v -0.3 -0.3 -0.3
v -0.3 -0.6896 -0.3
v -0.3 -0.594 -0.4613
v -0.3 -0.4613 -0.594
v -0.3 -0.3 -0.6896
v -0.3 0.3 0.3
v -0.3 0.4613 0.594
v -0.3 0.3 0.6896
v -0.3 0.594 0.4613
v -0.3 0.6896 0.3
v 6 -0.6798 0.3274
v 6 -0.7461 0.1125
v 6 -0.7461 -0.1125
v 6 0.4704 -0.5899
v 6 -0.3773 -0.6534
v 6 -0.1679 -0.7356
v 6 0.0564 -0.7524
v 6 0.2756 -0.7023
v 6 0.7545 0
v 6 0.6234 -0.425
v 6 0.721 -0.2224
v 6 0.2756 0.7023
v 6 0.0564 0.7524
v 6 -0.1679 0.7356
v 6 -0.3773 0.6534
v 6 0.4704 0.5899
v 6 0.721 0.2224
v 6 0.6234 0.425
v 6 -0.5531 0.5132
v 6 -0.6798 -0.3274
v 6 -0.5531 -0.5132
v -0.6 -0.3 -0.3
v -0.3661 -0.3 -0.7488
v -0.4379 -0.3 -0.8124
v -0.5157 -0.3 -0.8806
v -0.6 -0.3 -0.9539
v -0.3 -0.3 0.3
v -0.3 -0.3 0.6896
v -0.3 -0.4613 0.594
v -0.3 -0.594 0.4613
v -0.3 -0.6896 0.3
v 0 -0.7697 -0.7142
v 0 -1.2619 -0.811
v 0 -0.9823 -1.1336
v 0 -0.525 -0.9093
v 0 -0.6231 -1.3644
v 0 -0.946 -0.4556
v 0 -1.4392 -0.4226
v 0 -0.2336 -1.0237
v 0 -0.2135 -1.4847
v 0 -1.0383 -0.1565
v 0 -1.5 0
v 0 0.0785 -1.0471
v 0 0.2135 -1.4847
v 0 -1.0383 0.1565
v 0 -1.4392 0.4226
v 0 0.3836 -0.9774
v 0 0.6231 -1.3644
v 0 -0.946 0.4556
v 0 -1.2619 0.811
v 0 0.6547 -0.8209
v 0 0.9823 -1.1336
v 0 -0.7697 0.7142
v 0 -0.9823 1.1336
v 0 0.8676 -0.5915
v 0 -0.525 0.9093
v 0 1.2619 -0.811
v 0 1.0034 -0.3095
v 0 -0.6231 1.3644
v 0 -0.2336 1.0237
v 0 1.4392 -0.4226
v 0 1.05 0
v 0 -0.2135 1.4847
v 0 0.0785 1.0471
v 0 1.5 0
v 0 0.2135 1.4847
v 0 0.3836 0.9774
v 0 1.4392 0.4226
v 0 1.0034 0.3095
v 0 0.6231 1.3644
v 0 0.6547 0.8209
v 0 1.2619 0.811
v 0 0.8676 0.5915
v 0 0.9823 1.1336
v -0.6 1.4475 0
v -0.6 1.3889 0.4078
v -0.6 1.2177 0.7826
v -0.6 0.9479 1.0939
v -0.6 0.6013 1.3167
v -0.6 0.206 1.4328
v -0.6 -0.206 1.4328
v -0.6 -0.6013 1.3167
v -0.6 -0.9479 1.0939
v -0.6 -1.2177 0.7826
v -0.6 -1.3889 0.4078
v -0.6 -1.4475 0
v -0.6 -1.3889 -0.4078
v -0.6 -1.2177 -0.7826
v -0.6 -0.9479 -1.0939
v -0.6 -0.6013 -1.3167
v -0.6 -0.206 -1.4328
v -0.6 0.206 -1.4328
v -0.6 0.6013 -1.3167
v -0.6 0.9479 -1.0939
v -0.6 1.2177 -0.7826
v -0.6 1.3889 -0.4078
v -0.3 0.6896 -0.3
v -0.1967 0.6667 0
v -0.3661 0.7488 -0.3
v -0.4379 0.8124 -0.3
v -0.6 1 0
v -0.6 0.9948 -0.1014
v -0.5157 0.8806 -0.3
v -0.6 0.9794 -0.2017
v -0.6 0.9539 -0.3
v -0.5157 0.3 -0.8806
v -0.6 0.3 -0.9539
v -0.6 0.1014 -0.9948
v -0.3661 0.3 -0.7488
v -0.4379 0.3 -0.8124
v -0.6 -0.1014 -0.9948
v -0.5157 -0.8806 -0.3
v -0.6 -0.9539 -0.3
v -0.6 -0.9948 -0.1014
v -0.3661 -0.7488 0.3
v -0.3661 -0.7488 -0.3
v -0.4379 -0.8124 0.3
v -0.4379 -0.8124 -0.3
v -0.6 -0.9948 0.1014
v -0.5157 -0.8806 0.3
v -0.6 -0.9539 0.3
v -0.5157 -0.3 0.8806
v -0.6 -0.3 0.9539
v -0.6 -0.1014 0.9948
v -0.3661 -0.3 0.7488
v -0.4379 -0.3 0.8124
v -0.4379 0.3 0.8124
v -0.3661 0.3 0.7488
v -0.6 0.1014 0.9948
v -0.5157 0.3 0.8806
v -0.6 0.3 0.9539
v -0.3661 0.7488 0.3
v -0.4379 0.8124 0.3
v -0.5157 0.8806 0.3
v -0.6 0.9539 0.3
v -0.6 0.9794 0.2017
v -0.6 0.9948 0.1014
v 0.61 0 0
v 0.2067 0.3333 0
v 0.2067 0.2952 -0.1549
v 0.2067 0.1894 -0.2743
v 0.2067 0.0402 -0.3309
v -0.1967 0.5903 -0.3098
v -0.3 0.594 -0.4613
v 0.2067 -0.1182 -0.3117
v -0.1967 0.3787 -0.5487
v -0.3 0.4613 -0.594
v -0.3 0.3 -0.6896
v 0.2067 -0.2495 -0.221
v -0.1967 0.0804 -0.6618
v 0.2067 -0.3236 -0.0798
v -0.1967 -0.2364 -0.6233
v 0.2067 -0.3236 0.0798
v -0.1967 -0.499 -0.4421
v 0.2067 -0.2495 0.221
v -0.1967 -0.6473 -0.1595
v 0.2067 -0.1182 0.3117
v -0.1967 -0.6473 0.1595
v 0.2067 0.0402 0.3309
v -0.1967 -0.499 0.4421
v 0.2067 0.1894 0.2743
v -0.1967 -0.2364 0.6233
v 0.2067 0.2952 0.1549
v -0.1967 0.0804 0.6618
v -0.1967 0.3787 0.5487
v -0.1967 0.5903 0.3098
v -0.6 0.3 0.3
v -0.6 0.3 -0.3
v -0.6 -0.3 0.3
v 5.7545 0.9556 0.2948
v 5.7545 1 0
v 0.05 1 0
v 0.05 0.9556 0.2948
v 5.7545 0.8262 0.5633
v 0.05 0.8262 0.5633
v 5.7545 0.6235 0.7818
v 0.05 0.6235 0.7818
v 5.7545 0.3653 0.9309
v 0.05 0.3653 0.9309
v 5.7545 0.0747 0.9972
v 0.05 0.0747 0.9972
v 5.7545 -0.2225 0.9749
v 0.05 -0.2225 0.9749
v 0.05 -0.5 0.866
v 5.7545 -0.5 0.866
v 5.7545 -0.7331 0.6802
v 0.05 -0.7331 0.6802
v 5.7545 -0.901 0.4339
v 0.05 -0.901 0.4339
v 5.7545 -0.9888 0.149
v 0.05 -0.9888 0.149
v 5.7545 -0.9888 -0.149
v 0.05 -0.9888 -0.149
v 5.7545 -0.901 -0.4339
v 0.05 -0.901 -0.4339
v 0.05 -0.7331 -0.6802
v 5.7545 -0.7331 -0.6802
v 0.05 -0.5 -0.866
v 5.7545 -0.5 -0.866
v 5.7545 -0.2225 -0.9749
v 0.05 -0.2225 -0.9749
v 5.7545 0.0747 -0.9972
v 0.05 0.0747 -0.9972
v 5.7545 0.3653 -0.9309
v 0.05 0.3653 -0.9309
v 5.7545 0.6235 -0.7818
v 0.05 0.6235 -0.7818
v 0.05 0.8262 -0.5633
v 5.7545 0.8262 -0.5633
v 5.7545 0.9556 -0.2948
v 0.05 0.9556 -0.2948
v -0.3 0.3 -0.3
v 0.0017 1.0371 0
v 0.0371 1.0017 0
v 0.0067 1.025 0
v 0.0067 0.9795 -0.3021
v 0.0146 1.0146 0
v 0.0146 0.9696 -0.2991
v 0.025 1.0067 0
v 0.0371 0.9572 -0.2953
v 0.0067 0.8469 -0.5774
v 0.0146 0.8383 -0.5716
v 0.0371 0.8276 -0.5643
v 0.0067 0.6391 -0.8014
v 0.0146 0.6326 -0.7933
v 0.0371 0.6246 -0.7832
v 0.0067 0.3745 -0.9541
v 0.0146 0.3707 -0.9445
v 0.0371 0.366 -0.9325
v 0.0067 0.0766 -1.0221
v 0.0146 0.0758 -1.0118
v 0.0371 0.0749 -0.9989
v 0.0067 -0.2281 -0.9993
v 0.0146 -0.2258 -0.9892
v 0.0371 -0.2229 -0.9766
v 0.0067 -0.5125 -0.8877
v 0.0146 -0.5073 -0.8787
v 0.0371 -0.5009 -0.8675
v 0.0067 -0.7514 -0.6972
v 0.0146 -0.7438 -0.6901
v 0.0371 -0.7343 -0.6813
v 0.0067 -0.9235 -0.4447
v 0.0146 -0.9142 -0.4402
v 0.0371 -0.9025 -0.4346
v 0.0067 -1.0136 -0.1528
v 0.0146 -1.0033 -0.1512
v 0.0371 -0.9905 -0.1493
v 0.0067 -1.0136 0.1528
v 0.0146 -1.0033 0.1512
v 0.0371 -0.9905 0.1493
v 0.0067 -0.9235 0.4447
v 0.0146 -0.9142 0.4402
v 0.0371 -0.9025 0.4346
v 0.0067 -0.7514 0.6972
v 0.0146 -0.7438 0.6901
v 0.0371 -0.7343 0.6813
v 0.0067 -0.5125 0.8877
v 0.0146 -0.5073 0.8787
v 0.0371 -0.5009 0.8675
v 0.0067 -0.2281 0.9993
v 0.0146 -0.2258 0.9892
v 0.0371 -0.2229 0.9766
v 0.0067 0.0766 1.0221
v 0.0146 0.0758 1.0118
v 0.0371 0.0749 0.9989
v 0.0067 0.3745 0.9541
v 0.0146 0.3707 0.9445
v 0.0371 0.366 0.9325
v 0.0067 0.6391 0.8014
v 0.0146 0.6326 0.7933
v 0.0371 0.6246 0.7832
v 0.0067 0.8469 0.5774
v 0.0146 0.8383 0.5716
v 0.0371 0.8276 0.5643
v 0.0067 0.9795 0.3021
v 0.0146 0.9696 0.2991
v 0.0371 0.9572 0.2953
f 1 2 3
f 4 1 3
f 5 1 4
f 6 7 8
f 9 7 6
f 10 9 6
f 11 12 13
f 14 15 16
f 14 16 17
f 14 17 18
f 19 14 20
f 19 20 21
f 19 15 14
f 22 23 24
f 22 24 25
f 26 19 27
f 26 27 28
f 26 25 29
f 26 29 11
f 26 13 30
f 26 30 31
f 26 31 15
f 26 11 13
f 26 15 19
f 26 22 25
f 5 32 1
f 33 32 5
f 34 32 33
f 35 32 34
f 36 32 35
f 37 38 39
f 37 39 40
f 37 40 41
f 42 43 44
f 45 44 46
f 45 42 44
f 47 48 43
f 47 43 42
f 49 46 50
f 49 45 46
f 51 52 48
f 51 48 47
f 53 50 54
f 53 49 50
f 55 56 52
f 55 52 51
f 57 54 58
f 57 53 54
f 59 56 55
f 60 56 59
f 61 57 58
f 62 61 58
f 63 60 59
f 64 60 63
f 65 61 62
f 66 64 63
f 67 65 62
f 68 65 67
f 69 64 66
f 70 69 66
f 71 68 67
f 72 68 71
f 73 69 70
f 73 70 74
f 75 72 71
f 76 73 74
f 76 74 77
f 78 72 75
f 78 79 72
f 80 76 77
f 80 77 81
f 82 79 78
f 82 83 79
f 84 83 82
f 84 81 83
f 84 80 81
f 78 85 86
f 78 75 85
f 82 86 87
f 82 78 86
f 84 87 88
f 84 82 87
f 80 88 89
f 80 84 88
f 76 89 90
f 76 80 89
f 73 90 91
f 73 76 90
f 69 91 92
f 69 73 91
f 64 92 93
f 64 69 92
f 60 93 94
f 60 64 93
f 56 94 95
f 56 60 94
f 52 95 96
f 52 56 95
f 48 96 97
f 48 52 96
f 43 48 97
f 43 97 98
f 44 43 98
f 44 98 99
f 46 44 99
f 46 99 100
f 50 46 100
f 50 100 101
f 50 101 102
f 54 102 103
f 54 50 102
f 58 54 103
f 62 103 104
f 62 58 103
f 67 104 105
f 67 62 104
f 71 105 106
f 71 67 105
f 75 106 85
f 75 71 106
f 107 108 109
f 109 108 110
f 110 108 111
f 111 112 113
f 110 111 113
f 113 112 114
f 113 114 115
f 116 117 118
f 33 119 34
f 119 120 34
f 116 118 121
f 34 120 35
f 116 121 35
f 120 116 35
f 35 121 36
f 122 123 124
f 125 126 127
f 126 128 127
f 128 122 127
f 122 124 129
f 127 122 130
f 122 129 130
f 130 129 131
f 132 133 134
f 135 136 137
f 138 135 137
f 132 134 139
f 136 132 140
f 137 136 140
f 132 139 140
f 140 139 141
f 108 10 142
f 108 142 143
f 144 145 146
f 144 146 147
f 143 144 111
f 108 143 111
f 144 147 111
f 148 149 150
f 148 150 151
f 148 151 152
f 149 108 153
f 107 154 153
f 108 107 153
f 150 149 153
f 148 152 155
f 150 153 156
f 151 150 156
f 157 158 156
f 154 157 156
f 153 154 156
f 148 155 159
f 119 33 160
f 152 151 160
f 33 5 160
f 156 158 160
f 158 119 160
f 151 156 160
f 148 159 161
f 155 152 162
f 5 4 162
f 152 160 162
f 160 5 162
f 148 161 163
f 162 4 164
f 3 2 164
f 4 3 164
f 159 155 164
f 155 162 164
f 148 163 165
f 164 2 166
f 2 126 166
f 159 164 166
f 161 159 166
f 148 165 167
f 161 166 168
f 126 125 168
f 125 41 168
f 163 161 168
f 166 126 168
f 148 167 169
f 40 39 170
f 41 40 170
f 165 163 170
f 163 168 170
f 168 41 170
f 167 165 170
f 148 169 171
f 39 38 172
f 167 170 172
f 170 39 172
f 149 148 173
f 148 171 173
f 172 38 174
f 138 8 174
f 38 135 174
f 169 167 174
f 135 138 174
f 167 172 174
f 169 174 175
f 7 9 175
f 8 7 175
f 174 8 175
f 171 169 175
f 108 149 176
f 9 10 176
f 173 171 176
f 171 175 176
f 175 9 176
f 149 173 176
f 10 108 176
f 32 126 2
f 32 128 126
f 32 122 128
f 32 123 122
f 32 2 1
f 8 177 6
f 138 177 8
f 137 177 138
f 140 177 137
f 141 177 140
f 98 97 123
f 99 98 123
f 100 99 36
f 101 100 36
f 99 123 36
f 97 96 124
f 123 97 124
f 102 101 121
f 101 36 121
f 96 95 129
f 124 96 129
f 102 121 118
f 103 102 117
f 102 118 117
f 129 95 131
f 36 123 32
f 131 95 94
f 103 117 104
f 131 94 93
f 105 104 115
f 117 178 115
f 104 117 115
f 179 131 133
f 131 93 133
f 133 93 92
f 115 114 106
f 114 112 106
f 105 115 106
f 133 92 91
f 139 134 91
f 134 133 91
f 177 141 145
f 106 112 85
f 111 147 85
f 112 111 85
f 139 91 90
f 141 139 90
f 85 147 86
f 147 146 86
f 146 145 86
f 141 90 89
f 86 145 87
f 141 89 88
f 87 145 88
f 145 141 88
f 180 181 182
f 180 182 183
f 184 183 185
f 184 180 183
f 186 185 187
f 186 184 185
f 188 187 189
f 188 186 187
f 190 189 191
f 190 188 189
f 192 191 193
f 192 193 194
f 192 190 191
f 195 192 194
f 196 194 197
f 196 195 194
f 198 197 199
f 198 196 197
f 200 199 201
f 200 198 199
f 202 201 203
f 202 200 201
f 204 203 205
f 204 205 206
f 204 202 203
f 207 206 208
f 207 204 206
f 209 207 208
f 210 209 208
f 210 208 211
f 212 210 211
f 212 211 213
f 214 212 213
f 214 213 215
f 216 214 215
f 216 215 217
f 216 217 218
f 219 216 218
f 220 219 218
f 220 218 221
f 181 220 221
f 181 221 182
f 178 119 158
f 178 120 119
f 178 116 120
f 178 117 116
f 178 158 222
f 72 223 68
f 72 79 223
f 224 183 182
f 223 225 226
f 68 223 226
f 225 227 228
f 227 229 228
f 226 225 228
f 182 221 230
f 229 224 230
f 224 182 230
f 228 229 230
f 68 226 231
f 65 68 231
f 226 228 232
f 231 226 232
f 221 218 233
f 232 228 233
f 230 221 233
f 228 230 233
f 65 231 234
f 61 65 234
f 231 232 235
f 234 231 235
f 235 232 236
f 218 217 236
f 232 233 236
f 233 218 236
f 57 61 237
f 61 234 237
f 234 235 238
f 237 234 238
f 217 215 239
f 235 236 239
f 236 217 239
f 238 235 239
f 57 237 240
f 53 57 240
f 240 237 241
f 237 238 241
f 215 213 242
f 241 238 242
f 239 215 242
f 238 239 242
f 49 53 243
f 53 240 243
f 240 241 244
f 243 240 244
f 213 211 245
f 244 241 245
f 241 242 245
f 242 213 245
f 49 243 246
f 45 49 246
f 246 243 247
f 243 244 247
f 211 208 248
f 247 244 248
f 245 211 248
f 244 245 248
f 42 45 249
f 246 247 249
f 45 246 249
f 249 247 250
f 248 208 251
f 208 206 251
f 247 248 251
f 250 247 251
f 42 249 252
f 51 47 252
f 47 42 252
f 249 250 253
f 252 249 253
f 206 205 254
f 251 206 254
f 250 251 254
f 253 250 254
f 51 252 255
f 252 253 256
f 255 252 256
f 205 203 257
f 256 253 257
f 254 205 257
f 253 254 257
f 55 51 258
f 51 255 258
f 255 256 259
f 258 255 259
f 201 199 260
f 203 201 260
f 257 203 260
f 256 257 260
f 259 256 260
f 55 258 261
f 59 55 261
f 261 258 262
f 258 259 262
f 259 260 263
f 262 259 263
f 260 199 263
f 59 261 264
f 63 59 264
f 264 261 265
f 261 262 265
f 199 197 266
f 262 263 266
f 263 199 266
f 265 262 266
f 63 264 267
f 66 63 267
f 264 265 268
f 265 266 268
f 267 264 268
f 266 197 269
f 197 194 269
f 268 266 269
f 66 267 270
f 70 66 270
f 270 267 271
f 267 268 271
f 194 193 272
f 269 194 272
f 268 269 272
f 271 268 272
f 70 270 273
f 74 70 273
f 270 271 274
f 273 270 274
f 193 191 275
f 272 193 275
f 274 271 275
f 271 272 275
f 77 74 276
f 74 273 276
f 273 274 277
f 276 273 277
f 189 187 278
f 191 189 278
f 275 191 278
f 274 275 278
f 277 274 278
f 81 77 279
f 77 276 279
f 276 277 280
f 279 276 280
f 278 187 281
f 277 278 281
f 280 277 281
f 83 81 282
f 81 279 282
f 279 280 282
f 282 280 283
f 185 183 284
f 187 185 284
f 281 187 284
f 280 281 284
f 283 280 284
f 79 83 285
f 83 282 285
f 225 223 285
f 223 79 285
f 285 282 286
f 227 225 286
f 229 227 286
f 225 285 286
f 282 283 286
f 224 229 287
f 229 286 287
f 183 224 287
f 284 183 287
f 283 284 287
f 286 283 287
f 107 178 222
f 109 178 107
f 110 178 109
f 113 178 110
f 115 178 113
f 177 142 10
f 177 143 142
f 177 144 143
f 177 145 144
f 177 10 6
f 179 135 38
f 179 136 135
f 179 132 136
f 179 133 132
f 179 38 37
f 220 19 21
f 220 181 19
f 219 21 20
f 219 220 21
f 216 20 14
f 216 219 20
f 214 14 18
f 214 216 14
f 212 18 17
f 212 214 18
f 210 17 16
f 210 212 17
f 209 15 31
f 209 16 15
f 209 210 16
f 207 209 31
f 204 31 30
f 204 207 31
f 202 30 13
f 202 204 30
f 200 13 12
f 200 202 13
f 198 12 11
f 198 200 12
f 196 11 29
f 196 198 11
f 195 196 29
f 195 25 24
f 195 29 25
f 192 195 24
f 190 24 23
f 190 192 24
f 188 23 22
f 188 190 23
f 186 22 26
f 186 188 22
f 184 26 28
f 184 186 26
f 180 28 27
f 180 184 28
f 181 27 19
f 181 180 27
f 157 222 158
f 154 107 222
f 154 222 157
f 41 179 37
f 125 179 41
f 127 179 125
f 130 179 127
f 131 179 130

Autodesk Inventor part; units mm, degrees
sketch "Sketch_1" plane through (0, 0, 0) normal (0, 0, 1) x (1, 0, 0)
  line L0 (6, 0) -> (-0.6, 0)
  line L1 (-0.6, 0) -> (-0.6, 1.5)
  line L2 (-0.6, 1.5) -> (0, 1.5)
  line L3 (0, 1.5) -> (0, 1.05)
  arc A0 (0, 1.05) -> (0.05, 1) centre (0.05, 1.05) ccw
  line L4 (0.05, 1) -> (5.7545, 1)
  line L5 (5.7545, 1) -> (6, 0.7545)
  line L6 (6, 0.7545) -> (6, 0)
  line L7 (6, 0) -> (-0.6, 0)
revolve "Revolution1" add sketch "Sketch_1" angle 360 about axis through (6, 0, 0) along (1, 0, 0)
thread "Thread1" size "M2x0.4" class "6g" standard "ISO Metric profile" length 5.3545
sketch "Sketch_3" plane through (0, 0, 0) normal (0, 0, 1) x (1, 0, 0)
  line L0 (0.61, 0) -> (-0.6, 0)
  line L1 (-0.6, 0) -> (-0.6, 1)
  line L2 (-0.6, 1) -> (0.61, 0)
  line L3 (0.61, 0) -> (-0.6, 0)
revolve "Revolution2" cut sketch "Sketch_3" angle 360 about axis through (0.61, 0, 0) along (1, 0, 0)
sketch "Sketch_5" plane through (-0.6, 0, 0) normal (1, 0, 0) x (0, 0, -1)
  circle A0 centre (0, 0) radius 1.1
  arc A1 (-0.9539, 0.3) -> (-0.9539, -0.3) centre (0, 0) ccw
  line L0 (-0.9539, -0.3) -> (-0.3, -0.3)
  line L1 (-0.3, -0.3) -> (-0.3, -0.9539)
  arc A2 (-0.3, -0.9539) -> (0.3, -0.9539) centre (0, 0) ccw
  line L2 (0.3, -0.9539) -> (0.3, -0.3)
  line L3 (0.3, -0.3) -> (0.9539, -0.3)
  arc A3 (0.9539, -0.3) -> (0.9539, 0.3) centre (0, 0) ccw
  line L4 (0.9539, 0.3) -> (0.3, 0.3)
  line L5 (0.3, 0.3) -> (0.3, 0.9539)
  arc A4 (0.3, 0.9539) -> (-0.3, 0.9539) centre (0, 0) ccw
  line L6 (-0.3, 0.9539) -> (-0.3, 0.3)
  line L7 (-0.3, 0.3) -> (-0.9539, 0.3)
extrude "Extrusion1" add sketch "Sketch_5" along normal blind 0.3
sketch "Sketch_6" plane through (0, 0, 0) normal (0, 0, 1) x (1, 0, 0)
  line L0 (50, 0) -> (-50, 0)
  line L1 (-0.6, 1.5) -> (-0.6, 1.4475)
  line L2 (-0.6, 1.4475) -> (0, 1.5)
  line L3 (0, 1.5) -> (-0.6, 1.5)
revolve "Revolution3" cut sketch "Sketch_6" angle 360 about axis through (50, 0, 0) along (1, 0, 0)
ref_plane "screw_to_rail_XY" through (0, 0, 0) normal (-1, 0, 0) x (0, 0, -1)
ref_plane "screw_to_rail_YZ" through (0, 0, 0) normal (0, 0, -1) x (0, -1, 0)
ref_plane "screw_to_rail_ZX" through (0, 0, 0) normal (0, -1, 0) x (-1, 0, 0)
properties part number "M2x6_b" material "ステンレス鋼"
